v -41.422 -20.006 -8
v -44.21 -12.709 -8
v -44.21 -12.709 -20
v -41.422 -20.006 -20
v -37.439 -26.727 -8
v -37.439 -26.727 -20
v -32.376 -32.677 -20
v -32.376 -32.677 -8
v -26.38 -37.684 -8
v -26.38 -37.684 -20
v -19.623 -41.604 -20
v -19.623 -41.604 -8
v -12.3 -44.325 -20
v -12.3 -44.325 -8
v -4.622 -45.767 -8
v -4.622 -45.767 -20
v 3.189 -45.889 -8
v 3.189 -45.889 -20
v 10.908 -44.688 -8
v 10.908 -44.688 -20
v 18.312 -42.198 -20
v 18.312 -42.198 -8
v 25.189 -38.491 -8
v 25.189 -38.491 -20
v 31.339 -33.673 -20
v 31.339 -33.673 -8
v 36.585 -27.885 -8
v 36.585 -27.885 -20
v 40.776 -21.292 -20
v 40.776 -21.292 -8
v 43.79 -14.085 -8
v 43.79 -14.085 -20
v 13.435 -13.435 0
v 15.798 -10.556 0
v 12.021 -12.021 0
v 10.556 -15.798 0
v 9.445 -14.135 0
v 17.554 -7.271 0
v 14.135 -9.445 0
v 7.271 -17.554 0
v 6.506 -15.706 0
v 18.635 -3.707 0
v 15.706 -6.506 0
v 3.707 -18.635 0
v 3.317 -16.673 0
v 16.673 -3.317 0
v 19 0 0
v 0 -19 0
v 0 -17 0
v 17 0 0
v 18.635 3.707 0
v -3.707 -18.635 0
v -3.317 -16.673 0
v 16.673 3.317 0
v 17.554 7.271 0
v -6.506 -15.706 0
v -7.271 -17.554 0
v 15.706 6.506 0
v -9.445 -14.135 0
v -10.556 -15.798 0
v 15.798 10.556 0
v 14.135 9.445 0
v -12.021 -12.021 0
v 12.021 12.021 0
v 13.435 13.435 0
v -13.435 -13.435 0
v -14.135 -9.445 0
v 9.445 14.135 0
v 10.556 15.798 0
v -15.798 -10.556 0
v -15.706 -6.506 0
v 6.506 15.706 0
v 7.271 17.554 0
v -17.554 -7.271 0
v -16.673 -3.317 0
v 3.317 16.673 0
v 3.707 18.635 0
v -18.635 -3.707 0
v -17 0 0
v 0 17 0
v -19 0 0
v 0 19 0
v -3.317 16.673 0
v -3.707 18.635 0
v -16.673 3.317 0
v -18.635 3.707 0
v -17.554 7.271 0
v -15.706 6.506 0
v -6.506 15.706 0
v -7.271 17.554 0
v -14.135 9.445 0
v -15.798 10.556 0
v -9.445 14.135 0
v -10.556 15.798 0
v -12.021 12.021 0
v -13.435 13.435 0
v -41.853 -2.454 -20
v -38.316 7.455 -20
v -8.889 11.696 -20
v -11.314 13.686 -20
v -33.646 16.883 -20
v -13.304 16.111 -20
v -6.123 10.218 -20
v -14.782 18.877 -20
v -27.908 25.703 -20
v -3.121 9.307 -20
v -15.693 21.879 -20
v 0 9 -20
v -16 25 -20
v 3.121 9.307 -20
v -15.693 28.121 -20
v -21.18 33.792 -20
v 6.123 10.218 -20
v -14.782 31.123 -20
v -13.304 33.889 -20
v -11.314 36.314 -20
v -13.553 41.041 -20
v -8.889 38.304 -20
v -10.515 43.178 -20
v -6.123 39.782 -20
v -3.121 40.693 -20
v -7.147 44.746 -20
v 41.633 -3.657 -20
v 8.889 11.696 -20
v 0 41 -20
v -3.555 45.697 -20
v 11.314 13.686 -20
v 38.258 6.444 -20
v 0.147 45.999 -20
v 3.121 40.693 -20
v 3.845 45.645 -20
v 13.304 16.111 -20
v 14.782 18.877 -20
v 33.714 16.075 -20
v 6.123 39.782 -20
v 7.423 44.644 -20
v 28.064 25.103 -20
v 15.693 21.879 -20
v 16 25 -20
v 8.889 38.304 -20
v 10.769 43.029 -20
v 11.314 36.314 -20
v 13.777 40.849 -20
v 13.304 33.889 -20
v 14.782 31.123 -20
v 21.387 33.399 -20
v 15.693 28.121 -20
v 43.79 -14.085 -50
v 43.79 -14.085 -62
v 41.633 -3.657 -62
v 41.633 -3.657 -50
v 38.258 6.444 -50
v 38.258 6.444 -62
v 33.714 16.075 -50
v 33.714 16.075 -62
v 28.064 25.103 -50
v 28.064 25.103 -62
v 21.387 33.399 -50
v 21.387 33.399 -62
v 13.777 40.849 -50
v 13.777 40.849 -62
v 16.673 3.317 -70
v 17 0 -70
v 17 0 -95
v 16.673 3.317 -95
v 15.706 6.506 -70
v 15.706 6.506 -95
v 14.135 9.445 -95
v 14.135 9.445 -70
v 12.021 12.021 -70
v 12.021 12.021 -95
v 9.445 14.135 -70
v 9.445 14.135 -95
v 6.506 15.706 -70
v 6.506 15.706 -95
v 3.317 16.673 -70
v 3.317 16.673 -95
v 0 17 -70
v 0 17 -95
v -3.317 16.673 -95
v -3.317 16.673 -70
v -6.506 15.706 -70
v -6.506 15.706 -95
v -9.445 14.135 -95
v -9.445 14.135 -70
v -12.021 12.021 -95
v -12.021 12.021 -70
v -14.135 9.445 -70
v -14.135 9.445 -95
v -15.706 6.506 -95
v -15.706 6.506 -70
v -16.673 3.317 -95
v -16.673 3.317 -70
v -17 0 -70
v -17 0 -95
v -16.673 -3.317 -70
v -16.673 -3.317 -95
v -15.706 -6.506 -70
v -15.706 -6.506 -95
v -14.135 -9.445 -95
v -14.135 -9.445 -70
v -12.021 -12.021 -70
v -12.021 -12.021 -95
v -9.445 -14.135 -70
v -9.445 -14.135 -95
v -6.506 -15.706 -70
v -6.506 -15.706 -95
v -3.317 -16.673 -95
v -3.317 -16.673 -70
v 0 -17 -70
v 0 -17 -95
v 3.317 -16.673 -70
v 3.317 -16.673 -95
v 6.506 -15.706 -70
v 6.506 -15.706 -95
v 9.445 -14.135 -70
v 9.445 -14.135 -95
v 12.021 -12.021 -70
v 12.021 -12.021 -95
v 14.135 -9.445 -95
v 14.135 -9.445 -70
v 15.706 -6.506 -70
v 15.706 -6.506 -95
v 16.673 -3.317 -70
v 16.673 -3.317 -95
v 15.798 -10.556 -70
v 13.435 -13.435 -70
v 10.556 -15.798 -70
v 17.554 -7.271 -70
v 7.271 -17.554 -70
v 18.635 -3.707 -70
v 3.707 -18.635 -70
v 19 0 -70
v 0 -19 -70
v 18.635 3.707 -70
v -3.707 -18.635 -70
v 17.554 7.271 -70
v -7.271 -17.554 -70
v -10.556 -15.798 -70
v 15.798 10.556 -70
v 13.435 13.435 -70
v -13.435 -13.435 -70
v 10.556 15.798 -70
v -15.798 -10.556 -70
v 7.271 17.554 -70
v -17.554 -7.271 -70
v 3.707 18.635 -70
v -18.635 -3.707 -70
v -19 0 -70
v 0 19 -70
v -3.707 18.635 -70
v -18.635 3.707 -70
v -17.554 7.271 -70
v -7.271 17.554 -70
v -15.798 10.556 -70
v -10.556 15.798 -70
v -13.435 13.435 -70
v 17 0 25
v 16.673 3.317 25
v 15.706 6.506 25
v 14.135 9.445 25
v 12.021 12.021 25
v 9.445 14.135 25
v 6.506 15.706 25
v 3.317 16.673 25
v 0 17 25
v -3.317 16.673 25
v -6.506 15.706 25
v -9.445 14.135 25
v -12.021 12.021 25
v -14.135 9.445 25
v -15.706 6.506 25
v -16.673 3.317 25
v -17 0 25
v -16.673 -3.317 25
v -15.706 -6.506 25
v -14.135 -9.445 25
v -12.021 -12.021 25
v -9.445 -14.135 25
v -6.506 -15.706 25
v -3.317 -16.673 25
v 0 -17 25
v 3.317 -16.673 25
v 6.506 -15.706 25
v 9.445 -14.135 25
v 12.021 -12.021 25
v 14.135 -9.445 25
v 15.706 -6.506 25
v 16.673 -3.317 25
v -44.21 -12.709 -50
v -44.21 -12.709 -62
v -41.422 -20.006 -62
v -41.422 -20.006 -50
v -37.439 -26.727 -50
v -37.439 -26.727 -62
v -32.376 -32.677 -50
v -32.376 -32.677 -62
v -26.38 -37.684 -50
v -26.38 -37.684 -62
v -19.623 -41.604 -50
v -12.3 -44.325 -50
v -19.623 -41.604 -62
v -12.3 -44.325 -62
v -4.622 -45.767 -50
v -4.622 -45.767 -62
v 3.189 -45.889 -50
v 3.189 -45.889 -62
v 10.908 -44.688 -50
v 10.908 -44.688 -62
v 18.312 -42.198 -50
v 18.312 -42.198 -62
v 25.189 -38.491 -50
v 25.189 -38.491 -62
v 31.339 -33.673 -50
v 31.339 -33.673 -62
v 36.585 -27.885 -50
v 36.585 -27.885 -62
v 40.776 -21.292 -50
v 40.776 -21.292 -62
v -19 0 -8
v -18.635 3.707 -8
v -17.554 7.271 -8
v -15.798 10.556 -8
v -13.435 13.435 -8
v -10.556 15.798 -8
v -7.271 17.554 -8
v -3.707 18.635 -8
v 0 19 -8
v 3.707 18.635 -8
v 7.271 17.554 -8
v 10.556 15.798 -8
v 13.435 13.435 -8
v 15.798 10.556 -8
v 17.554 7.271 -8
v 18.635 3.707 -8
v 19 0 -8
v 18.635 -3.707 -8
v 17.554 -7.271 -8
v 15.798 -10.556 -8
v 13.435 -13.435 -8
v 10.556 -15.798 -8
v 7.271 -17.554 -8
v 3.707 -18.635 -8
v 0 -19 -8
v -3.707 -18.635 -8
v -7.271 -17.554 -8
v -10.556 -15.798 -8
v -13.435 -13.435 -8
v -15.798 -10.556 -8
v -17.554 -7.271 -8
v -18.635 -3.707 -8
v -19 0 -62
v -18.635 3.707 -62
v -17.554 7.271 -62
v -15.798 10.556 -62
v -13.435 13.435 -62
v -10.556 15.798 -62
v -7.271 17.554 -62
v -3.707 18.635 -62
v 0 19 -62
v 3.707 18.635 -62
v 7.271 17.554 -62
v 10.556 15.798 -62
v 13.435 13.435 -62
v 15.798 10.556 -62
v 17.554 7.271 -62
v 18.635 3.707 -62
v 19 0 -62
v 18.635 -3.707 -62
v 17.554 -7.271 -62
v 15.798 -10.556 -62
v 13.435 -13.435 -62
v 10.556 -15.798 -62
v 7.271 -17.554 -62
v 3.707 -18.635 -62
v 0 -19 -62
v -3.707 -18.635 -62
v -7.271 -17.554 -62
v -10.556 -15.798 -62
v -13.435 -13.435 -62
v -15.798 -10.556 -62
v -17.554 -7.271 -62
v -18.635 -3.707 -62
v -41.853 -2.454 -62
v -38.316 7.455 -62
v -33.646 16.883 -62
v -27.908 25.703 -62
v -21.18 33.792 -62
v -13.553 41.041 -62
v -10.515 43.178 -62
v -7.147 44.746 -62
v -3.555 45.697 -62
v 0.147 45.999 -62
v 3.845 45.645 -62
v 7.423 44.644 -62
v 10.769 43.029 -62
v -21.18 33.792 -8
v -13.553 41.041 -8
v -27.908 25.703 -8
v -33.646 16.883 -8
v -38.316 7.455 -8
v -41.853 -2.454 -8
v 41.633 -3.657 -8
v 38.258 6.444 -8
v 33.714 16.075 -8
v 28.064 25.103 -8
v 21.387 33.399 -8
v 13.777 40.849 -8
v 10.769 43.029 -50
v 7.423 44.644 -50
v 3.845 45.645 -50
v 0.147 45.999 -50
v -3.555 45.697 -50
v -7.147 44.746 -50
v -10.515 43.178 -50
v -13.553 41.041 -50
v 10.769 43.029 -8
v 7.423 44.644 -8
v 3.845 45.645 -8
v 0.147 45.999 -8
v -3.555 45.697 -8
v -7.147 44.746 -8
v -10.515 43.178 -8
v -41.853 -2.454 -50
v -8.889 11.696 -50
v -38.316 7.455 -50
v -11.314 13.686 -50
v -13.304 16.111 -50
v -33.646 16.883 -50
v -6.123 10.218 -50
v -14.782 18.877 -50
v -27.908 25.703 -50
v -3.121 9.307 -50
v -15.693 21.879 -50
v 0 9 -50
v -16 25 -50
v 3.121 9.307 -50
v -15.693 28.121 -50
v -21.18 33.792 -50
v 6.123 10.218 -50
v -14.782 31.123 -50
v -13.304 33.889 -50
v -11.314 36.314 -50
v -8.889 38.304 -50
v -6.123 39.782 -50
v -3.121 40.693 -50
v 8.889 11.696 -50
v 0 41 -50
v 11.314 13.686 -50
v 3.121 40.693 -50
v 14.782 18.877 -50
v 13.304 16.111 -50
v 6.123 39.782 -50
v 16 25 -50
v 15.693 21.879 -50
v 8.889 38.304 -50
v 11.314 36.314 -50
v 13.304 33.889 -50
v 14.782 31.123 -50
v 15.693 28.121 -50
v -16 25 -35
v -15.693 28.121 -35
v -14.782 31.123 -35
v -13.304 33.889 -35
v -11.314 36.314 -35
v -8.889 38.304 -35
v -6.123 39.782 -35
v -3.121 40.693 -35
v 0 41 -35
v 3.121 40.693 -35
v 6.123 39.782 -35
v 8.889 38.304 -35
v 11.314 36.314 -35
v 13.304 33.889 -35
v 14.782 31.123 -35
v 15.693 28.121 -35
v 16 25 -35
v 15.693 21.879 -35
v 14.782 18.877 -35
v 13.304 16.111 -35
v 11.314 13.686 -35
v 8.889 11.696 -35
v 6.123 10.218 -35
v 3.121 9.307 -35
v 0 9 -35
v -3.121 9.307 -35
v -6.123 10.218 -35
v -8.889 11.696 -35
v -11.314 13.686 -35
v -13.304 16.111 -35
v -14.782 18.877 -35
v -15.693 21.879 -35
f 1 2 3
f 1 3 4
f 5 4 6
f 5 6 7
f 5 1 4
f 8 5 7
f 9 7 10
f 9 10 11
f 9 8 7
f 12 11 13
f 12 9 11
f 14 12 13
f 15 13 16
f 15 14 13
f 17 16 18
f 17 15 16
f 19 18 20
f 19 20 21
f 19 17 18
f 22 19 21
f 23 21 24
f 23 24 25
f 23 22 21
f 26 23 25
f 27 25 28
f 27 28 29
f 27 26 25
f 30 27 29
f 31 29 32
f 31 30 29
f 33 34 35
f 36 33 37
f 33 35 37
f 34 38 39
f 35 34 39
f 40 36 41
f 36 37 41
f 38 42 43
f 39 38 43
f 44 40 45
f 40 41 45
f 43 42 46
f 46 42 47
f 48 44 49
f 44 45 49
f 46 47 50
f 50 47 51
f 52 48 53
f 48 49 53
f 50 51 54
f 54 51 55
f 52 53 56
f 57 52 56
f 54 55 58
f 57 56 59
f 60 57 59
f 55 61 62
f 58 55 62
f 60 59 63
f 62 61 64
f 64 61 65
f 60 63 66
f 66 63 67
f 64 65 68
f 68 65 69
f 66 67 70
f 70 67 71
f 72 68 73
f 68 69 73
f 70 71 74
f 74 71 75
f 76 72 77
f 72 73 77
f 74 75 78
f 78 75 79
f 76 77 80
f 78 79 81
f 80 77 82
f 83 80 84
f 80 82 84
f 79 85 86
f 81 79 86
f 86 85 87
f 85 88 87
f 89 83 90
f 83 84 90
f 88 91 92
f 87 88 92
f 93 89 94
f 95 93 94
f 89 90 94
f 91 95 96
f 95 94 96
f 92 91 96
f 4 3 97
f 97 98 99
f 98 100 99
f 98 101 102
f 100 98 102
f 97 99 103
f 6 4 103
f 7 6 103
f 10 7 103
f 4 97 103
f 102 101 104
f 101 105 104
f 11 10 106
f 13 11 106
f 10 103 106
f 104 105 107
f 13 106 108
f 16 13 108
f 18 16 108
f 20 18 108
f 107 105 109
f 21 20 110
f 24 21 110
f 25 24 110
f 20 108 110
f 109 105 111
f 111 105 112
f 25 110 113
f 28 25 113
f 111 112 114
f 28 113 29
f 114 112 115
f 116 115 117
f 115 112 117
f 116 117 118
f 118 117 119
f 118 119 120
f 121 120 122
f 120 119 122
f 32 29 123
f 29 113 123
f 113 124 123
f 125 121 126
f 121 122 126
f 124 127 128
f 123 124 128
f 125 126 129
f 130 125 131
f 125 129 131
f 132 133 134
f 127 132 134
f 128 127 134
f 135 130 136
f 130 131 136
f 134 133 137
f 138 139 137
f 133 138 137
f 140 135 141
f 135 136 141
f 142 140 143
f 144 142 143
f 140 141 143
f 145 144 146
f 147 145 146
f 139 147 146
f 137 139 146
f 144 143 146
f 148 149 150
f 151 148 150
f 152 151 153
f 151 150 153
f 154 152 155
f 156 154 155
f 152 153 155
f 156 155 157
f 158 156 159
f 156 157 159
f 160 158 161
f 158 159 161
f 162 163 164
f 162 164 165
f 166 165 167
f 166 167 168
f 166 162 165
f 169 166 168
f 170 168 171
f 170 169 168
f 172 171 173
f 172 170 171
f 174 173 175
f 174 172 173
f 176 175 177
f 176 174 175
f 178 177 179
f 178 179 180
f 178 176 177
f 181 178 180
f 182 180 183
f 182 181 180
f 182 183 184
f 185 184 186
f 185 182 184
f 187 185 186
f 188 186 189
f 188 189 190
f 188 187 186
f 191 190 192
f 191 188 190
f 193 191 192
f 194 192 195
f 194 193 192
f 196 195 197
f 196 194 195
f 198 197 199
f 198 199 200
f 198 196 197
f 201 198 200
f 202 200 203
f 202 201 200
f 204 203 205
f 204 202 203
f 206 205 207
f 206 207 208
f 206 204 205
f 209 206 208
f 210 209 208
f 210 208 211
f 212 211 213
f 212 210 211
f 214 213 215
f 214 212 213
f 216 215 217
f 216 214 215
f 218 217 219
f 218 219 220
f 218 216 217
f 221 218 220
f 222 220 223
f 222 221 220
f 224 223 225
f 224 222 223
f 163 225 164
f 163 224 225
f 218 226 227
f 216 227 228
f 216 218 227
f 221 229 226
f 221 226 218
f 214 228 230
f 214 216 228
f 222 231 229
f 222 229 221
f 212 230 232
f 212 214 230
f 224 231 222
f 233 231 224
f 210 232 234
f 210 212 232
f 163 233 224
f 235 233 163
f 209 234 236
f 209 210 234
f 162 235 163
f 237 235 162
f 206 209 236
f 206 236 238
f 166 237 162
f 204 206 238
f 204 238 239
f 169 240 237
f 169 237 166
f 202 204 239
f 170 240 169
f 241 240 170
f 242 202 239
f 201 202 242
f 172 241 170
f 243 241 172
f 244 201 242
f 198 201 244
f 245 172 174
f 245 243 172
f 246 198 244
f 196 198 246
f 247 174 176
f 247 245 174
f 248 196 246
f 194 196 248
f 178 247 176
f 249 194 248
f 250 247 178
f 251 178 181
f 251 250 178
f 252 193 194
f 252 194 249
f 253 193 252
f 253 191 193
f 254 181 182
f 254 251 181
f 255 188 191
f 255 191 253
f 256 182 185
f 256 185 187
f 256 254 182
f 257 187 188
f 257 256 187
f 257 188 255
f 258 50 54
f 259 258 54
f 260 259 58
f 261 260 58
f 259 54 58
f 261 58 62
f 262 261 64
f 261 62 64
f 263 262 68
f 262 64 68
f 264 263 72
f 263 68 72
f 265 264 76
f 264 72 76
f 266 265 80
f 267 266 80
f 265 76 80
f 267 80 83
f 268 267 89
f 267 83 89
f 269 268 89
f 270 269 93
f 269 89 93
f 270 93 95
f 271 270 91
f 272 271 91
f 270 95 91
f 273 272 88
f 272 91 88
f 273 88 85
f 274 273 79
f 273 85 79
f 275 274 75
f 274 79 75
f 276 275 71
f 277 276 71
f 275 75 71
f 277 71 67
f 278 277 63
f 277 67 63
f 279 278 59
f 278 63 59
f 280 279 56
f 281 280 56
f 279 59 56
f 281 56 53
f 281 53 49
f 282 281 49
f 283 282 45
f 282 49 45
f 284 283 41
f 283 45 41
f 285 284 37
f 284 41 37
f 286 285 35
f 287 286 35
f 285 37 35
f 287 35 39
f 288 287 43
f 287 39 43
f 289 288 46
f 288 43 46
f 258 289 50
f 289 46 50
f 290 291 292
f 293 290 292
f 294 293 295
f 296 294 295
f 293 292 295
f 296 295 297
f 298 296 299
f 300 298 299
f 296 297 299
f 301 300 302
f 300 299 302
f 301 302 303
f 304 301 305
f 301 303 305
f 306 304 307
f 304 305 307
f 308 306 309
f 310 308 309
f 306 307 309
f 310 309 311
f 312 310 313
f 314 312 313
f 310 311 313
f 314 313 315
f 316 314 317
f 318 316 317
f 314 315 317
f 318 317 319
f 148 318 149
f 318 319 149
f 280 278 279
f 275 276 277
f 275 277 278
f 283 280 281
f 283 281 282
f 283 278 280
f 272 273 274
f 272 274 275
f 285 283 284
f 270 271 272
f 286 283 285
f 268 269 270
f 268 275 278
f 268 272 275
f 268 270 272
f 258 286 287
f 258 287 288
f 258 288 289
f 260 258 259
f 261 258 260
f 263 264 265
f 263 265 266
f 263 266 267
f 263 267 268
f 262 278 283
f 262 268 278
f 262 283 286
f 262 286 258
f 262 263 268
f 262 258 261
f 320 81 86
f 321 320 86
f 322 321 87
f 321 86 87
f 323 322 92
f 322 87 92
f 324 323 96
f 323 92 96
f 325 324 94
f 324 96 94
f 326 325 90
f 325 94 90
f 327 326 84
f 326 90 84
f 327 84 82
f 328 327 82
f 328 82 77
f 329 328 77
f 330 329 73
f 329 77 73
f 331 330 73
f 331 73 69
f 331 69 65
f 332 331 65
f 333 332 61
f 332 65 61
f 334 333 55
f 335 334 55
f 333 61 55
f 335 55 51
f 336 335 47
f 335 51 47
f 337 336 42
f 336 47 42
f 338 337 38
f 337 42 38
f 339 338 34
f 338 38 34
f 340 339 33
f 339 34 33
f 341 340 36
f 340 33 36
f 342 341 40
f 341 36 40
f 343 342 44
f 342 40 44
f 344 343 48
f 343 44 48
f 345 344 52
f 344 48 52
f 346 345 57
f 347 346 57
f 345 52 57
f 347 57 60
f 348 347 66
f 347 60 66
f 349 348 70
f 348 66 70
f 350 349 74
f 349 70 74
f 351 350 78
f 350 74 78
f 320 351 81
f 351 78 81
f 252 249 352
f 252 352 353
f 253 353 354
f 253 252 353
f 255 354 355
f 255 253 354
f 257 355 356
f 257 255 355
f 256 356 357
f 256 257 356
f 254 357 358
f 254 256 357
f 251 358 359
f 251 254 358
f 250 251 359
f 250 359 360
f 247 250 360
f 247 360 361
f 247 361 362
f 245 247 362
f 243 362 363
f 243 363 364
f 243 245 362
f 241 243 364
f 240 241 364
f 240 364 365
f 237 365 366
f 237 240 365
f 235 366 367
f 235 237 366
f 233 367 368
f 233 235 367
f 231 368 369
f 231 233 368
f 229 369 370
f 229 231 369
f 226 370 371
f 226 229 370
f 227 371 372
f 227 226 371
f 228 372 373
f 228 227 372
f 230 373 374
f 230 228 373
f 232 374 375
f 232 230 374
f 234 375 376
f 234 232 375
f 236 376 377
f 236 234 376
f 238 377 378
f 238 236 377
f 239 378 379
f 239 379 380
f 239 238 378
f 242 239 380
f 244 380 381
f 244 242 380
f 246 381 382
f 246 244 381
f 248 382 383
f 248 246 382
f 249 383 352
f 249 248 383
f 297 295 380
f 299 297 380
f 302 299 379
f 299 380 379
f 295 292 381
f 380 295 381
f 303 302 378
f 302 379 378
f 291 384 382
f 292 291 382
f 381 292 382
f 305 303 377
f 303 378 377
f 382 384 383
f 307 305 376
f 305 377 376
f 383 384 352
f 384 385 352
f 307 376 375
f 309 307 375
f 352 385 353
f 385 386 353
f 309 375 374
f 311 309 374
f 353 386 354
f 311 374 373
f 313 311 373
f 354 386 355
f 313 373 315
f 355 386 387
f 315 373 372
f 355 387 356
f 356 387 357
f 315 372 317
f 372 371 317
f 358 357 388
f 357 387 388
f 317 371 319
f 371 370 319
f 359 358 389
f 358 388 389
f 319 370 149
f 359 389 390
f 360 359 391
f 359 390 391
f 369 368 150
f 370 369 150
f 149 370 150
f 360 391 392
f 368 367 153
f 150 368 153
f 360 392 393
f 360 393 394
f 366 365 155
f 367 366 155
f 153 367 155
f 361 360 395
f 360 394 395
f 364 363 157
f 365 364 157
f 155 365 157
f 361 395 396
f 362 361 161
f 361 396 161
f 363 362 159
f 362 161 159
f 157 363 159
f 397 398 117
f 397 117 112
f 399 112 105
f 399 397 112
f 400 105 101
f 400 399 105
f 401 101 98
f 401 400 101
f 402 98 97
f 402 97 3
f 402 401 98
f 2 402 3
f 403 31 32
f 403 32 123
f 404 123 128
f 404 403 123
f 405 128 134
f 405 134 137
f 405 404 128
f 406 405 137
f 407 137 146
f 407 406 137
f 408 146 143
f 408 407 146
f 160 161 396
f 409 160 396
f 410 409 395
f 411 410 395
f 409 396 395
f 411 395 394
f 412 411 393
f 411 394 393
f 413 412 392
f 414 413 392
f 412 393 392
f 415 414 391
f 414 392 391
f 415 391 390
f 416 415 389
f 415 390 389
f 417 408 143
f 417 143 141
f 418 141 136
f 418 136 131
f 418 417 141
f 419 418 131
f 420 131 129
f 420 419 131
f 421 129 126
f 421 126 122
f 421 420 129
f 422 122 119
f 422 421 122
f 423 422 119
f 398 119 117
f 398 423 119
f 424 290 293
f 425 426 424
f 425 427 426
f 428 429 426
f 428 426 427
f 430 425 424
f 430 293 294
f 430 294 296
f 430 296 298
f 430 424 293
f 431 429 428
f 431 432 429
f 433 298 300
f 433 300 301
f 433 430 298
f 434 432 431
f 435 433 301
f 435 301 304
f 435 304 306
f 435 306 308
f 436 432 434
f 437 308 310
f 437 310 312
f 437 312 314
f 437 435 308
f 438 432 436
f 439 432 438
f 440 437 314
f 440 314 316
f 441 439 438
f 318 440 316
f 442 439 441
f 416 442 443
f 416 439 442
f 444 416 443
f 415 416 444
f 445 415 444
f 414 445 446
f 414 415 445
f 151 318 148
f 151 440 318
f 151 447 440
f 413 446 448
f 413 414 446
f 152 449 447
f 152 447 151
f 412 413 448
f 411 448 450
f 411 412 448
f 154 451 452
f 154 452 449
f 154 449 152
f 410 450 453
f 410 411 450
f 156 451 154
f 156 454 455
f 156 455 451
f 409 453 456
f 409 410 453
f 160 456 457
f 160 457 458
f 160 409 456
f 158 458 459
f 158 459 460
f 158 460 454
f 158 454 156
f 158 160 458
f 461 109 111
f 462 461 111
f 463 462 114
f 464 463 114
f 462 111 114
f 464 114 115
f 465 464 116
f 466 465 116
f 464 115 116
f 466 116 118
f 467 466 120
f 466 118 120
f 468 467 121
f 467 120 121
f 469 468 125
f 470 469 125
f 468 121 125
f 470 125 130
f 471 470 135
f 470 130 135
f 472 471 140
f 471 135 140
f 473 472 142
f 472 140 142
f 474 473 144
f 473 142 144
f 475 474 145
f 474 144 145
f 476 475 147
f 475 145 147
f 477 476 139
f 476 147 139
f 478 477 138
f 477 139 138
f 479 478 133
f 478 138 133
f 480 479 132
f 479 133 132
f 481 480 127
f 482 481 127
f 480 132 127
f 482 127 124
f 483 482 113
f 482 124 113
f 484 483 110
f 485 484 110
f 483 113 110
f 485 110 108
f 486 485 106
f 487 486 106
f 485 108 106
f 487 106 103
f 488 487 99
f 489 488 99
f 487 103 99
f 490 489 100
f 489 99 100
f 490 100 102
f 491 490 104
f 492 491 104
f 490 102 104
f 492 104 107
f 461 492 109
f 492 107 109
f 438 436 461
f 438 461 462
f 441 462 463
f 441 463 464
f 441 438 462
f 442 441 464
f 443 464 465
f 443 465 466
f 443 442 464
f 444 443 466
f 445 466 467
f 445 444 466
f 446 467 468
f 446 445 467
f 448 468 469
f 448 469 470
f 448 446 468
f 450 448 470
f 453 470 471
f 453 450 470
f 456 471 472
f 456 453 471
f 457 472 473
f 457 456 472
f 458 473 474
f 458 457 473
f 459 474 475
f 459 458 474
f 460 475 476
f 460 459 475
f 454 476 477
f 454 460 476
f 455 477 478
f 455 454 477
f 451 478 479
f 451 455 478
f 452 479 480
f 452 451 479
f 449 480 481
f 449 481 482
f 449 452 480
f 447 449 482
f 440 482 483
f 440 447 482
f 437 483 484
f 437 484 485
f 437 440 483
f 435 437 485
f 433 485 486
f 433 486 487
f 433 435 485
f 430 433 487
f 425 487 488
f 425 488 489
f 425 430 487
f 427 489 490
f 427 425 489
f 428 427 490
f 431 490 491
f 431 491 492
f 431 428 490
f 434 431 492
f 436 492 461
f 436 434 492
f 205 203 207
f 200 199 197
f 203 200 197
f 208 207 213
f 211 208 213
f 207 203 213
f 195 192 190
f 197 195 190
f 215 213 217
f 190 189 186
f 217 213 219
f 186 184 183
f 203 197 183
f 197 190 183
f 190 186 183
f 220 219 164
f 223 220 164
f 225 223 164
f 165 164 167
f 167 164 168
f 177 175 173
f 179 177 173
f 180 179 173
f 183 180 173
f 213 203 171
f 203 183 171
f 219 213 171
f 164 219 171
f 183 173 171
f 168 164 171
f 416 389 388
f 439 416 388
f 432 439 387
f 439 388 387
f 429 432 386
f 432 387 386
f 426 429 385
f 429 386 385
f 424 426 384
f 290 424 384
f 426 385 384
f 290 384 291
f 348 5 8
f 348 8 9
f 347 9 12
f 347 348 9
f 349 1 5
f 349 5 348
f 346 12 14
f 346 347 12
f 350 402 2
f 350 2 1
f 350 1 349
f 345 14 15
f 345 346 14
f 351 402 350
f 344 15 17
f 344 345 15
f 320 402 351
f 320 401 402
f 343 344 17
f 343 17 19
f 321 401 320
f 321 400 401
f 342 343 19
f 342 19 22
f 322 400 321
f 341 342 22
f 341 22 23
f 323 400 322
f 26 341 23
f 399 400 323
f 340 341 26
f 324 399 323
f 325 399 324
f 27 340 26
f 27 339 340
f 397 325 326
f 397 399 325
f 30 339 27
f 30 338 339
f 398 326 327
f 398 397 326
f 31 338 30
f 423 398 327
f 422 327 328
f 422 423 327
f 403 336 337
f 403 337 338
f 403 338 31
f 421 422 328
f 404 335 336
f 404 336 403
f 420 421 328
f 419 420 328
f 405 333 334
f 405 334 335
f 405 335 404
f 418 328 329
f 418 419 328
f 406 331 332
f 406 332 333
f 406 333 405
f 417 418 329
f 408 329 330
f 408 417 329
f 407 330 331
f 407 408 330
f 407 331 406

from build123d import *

# Parameters (mm, degrees)
SKETCH1_R           = 17
BOSS_EXTRUDE1_DEPTH = 25
SKETCH2_R           = 19
BOSS_EXTRUDE2_DEPTH = 8
BOSS_EXTRUDE3_DEPTH = 12
SKETCH4_R           = 16
BOSS_EXTRUDE4_DEPTH = 15


with BuildPart() as part:
    # Sketch1 → Boss-Extrude1 (new body)
    with BuildSketch(Plane.XY):
        Circle(SKETCH1_R)
    extrude(amount=BOSS_EXTRUDE1_DEPTH)

    # Sketch2 → Boss-Extrude2 (add)
    with BuildSketch(Plane(origin=(0, 0, 0), x_dir=(-1, 0, 0), z_dir=(0, 0, -1))):
        Circle(SKETCH2_R)
    extrude(amount=BOSS_EXTRUDE2_DEPTH)

    # Sketch3 → Boss-Extrude3 (add)
    with BuildSketch(Plane(origin=(0, 0, -8), x_dir=(-1, 0, 0), z_dir=(0, 0, -1))):
        with BuildLine():
            ThreePointArc((-43.790428919, -14.085394388), (-33.713723077, 16.075398615), (-13.776954685, 40.84914886))
            ThreePointArc((-13.776954685, 40.84914886), (-0.147298901, 45.999483399), (13.55326526, 41.040854117))
            ThreePointArc((13.55326526, 41.040854117), (33.645906333, 16.883464851), (44.209571081, -12.708808948))
            ThreePointArc((44.209571081, -12.708808948), (0.719490727, -45.994372842), (-43.790428919, -14.085394388))
        make_face()
    extrude(amount=BOSS_EXTRUDE3_DEPTH)

    # Sketch4 → Boss-Extrude4 (add)
    with BuildSketch(Plane(origin=(0, 0, -20), x_dir=(-1, 0, 0), z_dir=(0, 0, -1))):
        with Locations((0, 25)):
            Circle(SKETCH4_R)
    extrude(amount=BOSS_EXTRUDE4_DEPTH)

    # Mirror1: part across plane


with BuildPart() as part_1:
    add(part.part)
    add(part.part.mirror(Plane(origin=(0, 25, -35), x_dir=(1, 0, 0), z_dir=(0, 0, -1))))


solid = part_1.part
